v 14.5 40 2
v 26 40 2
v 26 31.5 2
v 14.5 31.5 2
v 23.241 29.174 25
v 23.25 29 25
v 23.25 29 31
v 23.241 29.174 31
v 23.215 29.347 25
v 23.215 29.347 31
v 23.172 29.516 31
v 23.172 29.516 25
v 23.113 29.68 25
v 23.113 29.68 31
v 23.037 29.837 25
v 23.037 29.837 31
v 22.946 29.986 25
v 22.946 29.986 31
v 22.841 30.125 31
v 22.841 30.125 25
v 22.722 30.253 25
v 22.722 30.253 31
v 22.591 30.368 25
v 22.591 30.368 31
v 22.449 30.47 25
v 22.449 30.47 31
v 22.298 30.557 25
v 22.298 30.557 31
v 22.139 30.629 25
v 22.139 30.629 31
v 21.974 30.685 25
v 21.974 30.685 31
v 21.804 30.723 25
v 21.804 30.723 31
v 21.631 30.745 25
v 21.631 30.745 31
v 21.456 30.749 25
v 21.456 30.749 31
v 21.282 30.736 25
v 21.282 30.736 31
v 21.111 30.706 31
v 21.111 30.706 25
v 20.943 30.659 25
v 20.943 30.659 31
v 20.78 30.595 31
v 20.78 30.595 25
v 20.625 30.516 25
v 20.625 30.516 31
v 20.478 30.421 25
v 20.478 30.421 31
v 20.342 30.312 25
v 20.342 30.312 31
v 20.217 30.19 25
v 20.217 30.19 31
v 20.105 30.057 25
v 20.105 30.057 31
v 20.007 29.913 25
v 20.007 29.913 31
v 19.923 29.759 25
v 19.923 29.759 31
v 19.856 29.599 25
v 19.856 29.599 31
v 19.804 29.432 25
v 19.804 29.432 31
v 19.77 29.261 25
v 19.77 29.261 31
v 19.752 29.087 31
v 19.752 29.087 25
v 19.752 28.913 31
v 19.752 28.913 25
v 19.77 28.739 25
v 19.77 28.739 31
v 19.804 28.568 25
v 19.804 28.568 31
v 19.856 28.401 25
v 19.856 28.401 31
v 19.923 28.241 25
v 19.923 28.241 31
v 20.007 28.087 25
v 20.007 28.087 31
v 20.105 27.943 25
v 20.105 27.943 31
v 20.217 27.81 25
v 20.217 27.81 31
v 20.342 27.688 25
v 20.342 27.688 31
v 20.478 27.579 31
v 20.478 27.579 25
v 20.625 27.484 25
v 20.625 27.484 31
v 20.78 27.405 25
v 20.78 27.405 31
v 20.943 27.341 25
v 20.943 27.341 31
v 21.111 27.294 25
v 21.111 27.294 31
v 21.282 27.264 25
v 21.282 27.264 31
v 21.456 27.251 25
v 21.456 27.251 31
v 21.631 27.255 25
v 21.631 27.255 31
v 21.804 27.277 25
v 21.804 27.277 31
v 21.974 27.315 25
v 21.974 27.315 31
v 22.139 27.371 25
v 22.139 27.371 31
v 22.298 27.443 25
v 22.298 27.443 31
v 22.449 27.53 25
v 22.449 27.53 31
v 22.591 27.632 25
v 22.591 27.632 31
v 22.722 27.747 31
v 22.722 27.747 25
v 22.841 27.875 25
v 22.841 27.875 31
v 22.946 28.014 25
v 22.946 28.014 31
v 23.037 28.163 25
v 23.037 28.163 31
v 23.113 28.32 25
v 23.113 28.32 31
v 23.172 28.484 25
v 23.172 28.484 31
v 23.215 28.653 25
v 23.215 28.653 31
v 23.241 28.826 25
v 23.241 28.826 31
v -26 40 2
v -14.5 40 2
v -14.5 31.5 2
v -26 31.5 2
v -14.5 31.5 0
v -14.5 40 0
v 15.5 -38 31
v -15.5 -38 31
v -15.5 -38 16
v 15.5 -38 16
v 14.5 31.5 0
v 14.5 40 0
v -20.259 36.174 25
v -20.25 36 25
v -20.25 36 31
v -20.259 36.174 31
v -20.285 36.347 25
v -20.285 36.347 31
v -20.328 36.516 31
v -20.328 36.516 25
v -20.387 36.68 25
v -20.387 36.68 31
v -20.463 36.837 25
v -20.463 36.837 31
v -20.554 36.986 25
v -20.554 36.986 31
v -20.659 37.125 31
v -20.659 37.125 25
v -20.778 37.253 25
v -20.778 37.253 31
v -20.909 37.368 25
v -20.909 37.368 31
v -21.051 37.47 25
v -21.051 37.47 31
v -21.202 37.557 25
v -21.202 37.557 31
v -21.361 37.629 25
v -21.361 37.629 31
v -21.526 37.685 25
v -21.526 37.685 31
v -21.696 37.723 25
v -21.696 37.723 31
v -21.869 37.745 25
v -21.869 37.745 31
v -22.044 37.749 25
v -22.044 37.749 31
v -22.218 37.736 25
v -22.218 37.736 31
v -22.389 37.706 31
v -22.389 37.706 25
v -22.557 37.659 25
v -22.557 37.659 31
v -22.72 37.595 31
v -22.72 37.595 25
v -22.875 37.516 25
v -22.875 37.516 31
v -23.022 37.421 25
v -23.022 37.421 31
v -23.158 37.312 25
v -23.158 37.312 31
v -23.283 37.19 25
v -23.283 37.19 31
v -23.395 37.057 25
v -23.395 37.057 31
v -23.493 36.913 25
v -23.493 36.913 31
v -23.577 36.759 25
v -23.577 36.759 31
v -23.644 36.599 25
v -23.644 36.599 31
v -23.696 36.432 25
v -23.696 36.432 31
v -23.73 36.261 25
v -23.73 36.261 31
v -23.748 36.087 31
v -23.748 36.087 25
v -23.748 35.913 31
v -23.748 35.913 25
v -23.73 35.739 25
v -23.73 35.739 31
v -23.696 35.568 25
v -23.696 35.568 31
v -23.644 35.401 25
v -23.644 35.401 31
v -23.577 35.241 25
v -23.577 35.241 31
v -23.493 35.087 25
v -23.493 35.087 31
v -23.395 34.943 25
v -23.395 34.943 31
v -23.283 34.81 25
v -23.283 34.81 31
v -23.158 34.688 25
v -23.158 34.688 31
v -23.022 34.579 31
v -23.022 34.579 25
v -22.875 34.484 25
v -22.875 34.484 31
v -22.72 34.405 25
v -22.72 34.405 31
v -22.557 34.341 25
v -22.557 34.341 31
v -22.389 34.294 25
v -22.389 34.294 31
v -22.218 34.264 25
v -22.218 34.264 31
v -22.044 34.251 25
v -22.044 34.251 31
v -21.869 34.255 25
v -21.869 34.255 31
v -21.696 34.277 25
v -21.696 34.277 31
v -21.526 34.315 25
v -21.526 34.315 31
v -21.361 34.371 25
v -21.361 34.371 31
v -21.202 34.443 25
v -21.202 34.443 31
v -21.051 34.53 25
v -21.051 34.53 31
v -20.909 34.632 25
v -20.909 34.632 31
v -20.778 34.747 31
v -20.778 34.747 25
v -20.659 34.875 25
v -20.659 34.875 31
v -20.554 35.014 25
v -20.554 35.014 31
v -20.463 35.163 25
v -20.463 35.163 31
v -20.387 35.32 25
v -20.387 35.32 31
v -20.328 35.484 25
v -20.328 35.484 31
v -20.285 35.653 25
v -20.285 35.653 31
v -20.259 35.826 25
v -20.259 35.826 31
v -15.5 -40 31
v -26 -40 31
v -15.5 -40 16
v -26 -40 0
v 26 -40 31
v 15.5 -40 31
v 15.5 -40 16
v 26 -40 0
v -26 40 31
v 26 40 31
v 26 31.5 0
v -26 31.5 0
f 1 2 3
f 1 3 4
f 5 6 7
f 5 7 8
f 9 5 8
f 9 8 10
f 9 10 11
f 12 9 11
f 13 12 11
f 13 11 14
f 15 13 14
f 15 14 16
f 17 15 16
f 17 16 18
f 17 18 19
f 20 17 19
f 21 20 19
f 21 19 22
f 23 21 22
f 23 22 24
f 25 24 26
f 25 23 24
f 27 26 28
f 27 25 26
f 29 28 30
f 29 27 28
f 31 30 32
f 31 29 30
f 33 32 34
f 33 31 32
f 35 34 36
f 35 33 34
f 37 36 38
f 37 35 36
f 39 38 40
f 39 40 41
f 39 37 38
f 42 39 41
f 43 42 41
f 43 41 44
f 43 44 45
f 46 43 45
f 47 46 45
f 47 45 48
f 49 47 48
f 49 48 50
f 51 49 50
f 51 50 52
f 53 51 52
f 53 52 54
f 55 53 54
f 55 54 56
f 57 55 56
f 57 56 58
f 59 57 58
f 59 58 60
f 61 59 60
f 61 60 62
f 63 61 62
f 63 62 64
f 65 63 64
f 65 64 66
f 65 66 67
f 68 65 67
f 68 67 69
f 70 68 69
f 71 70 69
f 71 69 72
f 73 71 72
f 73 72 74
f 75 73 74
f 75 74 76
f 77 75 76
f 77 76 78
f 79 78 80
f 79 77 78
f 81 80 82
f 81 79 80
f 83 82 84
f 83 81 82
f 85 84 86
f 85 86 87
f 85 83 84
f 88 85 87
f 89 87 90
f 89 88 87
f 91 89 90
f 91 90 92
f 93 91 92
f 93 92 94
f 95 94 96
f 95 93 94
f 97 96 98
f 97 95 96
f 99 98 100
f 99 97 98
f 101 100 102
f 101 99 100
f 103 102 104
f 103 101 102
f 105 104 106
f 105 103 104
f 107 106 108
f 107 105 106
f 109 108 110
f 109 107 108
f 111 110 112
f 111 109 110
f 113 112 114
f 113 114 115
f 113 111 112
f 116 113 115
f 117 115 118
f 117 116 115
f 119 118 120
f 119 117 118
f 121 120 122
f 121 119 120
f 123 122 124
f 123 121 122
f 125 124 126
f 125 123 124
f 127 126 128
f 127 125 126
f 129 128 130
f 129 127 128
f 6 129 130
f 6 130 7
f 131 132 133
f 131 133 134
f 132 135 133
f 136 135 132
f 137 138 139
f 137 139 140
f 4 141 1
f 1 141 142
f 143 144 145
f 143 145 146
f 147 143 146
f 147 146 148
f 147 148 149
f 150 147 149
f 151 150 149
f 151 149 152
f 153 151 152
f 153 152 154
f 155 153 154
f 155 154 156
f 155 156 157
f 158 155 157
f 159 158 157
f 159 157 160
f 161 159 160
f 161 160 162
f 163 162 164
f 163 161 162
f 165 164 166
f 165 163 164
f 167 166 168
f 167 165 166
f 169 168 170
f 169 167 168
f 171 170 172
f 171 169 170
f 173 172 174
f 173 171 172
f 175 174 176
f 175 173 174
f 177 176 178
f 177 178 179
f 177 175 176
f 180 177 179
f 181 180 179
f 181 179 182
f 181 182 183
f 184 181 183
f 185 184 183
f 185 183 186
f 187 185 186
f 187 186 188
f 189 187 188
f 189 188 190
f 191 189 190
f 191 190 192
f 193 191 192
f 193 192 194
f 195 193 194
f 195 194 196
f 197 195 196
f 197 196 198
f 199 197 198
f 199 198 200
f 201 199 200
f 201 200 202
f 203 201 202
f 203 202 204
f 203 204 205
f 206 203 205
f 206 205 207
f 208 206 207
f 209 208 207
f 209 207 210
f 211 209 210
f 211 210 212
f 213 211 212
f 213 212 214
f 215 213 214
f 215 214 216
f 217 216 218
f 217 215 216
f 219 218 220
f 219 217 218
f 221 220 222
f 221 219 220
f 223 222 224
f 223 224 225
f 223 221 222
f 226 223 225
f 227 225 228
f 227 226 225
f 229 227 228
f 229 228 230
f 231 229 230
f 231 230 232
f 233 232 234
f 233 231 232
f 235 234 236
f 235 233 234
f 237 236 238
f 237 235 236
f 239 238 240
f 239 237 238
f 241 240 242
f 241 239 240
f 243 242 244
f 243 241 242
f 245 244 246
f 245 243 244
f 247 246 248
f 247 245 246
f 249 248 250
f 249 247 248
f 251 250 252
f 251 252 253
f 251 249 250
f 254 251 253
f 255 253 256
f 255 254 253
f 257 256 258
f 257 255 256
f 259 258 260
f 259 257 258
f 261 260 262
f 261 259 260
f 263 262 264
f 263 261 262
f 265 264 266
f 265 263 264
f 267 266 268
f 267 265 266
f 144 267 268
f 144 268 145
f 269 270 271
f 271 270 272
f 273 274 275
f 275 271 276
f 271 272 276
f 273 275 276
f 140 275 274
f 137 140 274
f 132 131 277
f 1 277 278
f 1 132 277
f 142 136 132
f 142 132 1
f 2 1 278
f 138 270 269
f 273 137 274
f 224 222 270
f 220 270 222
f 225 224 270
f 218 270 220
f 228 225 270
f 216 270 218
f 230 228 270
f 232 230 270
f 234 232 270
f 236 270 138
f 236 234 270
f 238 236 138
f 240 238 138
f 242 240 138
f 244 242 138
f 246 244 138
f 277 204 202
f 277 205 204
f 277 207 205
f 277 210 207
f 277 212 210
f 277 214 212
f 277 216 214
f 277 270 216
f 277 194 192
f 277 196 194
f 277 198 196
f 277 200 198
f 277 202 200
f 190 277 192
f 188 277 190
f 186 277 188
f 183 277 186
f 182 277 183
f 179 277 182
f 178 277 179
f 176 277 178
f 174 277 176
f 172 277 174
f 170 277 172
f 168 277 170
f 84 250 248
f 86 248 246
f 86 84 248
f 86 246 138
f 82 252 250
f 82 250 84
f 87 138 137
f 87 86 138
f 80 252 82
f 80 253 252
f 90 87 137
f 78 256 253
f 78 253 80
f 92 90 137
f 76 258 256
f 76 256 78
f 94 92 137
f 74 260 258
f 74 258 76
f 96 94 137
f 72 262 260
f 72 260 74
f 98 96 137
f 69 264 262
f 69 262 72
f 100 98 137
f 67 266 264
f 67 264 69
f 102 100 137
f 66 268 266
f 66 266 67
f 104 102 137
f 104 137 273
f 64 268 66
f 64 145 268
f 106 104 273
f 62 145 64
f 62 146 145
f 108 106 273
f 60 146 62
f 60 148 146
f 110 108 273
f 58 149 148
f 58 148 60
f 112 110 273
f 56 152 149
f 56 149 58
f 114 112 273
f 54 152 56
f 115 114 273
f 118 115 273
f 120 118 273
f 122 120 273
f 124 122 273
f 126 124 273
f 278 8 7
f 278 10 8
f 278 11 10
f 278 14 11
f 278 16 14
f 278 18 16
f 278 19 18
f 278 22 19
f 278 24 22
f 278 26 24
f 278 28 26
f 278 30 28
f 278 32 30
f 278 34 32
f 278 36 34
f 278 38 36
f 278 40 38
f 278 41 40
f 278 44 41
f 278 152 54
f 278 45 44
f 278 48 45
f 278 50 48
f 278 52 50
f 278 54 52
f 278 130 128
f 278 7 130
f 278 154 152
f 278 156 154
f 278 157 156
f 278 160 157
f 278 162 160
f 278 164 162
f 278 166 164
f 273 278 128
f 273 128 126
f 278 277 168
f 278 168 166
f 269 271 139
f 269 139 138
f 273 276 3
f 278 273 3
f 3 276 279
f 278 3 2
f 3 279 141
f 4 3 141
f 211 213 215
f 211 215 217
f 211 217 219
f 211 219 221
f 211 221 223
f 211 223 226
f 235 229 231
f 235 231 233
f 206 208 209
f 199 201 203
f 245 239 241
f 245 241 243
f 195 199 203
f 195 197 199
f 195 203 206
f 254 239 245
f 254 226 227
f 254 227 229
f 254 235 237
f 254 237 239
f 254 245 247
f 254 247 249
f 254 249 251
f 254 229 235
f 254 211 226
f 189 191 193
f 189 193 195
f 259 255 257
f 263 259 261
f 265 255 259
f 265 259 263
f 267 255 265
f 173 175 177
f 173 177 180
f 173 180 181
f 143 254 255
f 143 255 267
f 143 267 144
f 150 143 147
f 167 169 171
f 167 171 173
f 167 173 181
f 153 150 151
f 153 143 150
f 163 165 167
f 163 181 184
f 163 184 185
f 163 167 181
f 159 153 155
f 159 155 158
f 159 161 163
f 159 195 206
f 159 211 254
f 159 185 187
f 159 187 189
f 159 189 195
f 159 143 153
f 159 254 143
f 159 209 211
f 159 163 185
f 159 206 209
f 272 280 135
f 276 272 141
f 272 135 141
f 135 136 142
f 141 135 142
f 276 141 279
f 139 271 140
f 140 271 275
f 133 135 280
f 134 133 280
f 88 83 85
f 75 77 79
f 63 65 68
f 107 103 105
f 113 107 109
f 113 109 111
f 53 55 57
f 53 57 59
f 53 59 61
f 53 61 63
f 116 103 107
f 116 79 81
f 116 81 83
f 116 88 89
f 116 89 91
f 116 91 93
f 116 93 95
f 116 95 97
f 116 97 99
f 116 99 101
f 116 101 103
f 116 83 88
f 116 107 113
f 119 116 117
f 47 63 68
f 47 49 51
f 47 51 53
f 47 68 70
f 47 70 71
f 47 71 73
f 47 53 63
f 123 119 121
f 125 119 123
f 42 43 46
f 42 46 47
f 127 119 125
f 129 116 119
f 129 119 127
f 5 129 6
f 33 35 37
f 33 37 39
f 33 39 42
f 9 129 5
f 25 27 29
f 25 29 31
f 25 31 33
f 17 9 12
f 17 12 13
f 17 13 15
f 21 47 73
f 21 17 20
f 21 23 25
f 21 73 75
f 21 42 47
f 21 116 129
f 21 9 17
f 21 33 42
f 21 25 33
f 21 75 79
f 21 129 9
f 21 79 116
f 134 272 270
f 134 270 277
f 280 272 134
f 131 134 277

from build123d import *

# Parameters (mm, degrees)
ESQUISSE1_W             = 52
ESQUISSE1_H             = 80
ESQUISSE1_R             = 1.75
BOSS_EXTRU_1_DEPTH      = 31
ESQUISSE3_W             = 31
ESQUISSE3_H             = 15
ENL_V_MAT_EXTRU_3_DEPTH = 2
ESQUISSE1_2_R           = 1.75
BOSS_EXTRU_3_DEPTH      = 25
ESQUISSE2_W             = 11.5
ESQUISSE2_H             = 8.5
ENL_V_MAT_EXTRU_1_DEPTH = 2


with BuildPart() as part:
    # Esquisse1 → Boss.-Extru.1 (new body)
    with BuildSketch(Plane.XY):
        Rectangle(ESQUISSE1_W, ESQUISSE1_H)
        with Locations((21.5, 29)):
            Circle(ESQUISSE1_R, mode=Mode.SUBTRACT)
        with Locations((-22, 36)):
            Circle(ESQUISSE1_R, mode=Mode.SUBTRACT)
    extrude(amount=BOSS_EXTRU_1_DEPTH)

    # Esquisse3 → Enlèv. mat.-Extru.3 (cut)
    with BuildSketch(Plane.XZ.offset(40)):
        with Locations((0, 23.5)):
            Rectangle(ESQUISSE3_W, ESQUISSE3_H)
    extrude(amount=-ENL_V_MAT_EXTRU_3_DEPTH, mode=Mode.SUBTRACT)

    # Esquisse1<2> → Boss.-Extru.3 (add)
    with BuildSketch(Plane.XY):
        with Locations((21.5, 29)):
            Circle(ESQUISSE1_2_R)
        with Locations((-22, 36)):
            Circle(ESQUISSE1_2_R)
    extrude(amount=BOSS_EXTRU_3_DEPTH)

    # Esquisse2 → Enlèv. mat.-Extru.1 (cut)
    with BuildSketch(Plane(origin=(0, 0, 0), x_dir=(-1, 0, 0), z_dir=(0, 0, -1))):
        with Locations((-20.25, 35.75)):
            Rectangle(ESQUISSE2_W, ESQUISSE2_H)
        with Locations((20.25, 35.75)):
            Rectangle(ESQUISSE2_W, ESQUISSE2_H)
    extrude(amount=-ENL_V_MAT_EXTRU_1_DEPTH, mode=Mode.SUBTRACT)


solid = part.part
